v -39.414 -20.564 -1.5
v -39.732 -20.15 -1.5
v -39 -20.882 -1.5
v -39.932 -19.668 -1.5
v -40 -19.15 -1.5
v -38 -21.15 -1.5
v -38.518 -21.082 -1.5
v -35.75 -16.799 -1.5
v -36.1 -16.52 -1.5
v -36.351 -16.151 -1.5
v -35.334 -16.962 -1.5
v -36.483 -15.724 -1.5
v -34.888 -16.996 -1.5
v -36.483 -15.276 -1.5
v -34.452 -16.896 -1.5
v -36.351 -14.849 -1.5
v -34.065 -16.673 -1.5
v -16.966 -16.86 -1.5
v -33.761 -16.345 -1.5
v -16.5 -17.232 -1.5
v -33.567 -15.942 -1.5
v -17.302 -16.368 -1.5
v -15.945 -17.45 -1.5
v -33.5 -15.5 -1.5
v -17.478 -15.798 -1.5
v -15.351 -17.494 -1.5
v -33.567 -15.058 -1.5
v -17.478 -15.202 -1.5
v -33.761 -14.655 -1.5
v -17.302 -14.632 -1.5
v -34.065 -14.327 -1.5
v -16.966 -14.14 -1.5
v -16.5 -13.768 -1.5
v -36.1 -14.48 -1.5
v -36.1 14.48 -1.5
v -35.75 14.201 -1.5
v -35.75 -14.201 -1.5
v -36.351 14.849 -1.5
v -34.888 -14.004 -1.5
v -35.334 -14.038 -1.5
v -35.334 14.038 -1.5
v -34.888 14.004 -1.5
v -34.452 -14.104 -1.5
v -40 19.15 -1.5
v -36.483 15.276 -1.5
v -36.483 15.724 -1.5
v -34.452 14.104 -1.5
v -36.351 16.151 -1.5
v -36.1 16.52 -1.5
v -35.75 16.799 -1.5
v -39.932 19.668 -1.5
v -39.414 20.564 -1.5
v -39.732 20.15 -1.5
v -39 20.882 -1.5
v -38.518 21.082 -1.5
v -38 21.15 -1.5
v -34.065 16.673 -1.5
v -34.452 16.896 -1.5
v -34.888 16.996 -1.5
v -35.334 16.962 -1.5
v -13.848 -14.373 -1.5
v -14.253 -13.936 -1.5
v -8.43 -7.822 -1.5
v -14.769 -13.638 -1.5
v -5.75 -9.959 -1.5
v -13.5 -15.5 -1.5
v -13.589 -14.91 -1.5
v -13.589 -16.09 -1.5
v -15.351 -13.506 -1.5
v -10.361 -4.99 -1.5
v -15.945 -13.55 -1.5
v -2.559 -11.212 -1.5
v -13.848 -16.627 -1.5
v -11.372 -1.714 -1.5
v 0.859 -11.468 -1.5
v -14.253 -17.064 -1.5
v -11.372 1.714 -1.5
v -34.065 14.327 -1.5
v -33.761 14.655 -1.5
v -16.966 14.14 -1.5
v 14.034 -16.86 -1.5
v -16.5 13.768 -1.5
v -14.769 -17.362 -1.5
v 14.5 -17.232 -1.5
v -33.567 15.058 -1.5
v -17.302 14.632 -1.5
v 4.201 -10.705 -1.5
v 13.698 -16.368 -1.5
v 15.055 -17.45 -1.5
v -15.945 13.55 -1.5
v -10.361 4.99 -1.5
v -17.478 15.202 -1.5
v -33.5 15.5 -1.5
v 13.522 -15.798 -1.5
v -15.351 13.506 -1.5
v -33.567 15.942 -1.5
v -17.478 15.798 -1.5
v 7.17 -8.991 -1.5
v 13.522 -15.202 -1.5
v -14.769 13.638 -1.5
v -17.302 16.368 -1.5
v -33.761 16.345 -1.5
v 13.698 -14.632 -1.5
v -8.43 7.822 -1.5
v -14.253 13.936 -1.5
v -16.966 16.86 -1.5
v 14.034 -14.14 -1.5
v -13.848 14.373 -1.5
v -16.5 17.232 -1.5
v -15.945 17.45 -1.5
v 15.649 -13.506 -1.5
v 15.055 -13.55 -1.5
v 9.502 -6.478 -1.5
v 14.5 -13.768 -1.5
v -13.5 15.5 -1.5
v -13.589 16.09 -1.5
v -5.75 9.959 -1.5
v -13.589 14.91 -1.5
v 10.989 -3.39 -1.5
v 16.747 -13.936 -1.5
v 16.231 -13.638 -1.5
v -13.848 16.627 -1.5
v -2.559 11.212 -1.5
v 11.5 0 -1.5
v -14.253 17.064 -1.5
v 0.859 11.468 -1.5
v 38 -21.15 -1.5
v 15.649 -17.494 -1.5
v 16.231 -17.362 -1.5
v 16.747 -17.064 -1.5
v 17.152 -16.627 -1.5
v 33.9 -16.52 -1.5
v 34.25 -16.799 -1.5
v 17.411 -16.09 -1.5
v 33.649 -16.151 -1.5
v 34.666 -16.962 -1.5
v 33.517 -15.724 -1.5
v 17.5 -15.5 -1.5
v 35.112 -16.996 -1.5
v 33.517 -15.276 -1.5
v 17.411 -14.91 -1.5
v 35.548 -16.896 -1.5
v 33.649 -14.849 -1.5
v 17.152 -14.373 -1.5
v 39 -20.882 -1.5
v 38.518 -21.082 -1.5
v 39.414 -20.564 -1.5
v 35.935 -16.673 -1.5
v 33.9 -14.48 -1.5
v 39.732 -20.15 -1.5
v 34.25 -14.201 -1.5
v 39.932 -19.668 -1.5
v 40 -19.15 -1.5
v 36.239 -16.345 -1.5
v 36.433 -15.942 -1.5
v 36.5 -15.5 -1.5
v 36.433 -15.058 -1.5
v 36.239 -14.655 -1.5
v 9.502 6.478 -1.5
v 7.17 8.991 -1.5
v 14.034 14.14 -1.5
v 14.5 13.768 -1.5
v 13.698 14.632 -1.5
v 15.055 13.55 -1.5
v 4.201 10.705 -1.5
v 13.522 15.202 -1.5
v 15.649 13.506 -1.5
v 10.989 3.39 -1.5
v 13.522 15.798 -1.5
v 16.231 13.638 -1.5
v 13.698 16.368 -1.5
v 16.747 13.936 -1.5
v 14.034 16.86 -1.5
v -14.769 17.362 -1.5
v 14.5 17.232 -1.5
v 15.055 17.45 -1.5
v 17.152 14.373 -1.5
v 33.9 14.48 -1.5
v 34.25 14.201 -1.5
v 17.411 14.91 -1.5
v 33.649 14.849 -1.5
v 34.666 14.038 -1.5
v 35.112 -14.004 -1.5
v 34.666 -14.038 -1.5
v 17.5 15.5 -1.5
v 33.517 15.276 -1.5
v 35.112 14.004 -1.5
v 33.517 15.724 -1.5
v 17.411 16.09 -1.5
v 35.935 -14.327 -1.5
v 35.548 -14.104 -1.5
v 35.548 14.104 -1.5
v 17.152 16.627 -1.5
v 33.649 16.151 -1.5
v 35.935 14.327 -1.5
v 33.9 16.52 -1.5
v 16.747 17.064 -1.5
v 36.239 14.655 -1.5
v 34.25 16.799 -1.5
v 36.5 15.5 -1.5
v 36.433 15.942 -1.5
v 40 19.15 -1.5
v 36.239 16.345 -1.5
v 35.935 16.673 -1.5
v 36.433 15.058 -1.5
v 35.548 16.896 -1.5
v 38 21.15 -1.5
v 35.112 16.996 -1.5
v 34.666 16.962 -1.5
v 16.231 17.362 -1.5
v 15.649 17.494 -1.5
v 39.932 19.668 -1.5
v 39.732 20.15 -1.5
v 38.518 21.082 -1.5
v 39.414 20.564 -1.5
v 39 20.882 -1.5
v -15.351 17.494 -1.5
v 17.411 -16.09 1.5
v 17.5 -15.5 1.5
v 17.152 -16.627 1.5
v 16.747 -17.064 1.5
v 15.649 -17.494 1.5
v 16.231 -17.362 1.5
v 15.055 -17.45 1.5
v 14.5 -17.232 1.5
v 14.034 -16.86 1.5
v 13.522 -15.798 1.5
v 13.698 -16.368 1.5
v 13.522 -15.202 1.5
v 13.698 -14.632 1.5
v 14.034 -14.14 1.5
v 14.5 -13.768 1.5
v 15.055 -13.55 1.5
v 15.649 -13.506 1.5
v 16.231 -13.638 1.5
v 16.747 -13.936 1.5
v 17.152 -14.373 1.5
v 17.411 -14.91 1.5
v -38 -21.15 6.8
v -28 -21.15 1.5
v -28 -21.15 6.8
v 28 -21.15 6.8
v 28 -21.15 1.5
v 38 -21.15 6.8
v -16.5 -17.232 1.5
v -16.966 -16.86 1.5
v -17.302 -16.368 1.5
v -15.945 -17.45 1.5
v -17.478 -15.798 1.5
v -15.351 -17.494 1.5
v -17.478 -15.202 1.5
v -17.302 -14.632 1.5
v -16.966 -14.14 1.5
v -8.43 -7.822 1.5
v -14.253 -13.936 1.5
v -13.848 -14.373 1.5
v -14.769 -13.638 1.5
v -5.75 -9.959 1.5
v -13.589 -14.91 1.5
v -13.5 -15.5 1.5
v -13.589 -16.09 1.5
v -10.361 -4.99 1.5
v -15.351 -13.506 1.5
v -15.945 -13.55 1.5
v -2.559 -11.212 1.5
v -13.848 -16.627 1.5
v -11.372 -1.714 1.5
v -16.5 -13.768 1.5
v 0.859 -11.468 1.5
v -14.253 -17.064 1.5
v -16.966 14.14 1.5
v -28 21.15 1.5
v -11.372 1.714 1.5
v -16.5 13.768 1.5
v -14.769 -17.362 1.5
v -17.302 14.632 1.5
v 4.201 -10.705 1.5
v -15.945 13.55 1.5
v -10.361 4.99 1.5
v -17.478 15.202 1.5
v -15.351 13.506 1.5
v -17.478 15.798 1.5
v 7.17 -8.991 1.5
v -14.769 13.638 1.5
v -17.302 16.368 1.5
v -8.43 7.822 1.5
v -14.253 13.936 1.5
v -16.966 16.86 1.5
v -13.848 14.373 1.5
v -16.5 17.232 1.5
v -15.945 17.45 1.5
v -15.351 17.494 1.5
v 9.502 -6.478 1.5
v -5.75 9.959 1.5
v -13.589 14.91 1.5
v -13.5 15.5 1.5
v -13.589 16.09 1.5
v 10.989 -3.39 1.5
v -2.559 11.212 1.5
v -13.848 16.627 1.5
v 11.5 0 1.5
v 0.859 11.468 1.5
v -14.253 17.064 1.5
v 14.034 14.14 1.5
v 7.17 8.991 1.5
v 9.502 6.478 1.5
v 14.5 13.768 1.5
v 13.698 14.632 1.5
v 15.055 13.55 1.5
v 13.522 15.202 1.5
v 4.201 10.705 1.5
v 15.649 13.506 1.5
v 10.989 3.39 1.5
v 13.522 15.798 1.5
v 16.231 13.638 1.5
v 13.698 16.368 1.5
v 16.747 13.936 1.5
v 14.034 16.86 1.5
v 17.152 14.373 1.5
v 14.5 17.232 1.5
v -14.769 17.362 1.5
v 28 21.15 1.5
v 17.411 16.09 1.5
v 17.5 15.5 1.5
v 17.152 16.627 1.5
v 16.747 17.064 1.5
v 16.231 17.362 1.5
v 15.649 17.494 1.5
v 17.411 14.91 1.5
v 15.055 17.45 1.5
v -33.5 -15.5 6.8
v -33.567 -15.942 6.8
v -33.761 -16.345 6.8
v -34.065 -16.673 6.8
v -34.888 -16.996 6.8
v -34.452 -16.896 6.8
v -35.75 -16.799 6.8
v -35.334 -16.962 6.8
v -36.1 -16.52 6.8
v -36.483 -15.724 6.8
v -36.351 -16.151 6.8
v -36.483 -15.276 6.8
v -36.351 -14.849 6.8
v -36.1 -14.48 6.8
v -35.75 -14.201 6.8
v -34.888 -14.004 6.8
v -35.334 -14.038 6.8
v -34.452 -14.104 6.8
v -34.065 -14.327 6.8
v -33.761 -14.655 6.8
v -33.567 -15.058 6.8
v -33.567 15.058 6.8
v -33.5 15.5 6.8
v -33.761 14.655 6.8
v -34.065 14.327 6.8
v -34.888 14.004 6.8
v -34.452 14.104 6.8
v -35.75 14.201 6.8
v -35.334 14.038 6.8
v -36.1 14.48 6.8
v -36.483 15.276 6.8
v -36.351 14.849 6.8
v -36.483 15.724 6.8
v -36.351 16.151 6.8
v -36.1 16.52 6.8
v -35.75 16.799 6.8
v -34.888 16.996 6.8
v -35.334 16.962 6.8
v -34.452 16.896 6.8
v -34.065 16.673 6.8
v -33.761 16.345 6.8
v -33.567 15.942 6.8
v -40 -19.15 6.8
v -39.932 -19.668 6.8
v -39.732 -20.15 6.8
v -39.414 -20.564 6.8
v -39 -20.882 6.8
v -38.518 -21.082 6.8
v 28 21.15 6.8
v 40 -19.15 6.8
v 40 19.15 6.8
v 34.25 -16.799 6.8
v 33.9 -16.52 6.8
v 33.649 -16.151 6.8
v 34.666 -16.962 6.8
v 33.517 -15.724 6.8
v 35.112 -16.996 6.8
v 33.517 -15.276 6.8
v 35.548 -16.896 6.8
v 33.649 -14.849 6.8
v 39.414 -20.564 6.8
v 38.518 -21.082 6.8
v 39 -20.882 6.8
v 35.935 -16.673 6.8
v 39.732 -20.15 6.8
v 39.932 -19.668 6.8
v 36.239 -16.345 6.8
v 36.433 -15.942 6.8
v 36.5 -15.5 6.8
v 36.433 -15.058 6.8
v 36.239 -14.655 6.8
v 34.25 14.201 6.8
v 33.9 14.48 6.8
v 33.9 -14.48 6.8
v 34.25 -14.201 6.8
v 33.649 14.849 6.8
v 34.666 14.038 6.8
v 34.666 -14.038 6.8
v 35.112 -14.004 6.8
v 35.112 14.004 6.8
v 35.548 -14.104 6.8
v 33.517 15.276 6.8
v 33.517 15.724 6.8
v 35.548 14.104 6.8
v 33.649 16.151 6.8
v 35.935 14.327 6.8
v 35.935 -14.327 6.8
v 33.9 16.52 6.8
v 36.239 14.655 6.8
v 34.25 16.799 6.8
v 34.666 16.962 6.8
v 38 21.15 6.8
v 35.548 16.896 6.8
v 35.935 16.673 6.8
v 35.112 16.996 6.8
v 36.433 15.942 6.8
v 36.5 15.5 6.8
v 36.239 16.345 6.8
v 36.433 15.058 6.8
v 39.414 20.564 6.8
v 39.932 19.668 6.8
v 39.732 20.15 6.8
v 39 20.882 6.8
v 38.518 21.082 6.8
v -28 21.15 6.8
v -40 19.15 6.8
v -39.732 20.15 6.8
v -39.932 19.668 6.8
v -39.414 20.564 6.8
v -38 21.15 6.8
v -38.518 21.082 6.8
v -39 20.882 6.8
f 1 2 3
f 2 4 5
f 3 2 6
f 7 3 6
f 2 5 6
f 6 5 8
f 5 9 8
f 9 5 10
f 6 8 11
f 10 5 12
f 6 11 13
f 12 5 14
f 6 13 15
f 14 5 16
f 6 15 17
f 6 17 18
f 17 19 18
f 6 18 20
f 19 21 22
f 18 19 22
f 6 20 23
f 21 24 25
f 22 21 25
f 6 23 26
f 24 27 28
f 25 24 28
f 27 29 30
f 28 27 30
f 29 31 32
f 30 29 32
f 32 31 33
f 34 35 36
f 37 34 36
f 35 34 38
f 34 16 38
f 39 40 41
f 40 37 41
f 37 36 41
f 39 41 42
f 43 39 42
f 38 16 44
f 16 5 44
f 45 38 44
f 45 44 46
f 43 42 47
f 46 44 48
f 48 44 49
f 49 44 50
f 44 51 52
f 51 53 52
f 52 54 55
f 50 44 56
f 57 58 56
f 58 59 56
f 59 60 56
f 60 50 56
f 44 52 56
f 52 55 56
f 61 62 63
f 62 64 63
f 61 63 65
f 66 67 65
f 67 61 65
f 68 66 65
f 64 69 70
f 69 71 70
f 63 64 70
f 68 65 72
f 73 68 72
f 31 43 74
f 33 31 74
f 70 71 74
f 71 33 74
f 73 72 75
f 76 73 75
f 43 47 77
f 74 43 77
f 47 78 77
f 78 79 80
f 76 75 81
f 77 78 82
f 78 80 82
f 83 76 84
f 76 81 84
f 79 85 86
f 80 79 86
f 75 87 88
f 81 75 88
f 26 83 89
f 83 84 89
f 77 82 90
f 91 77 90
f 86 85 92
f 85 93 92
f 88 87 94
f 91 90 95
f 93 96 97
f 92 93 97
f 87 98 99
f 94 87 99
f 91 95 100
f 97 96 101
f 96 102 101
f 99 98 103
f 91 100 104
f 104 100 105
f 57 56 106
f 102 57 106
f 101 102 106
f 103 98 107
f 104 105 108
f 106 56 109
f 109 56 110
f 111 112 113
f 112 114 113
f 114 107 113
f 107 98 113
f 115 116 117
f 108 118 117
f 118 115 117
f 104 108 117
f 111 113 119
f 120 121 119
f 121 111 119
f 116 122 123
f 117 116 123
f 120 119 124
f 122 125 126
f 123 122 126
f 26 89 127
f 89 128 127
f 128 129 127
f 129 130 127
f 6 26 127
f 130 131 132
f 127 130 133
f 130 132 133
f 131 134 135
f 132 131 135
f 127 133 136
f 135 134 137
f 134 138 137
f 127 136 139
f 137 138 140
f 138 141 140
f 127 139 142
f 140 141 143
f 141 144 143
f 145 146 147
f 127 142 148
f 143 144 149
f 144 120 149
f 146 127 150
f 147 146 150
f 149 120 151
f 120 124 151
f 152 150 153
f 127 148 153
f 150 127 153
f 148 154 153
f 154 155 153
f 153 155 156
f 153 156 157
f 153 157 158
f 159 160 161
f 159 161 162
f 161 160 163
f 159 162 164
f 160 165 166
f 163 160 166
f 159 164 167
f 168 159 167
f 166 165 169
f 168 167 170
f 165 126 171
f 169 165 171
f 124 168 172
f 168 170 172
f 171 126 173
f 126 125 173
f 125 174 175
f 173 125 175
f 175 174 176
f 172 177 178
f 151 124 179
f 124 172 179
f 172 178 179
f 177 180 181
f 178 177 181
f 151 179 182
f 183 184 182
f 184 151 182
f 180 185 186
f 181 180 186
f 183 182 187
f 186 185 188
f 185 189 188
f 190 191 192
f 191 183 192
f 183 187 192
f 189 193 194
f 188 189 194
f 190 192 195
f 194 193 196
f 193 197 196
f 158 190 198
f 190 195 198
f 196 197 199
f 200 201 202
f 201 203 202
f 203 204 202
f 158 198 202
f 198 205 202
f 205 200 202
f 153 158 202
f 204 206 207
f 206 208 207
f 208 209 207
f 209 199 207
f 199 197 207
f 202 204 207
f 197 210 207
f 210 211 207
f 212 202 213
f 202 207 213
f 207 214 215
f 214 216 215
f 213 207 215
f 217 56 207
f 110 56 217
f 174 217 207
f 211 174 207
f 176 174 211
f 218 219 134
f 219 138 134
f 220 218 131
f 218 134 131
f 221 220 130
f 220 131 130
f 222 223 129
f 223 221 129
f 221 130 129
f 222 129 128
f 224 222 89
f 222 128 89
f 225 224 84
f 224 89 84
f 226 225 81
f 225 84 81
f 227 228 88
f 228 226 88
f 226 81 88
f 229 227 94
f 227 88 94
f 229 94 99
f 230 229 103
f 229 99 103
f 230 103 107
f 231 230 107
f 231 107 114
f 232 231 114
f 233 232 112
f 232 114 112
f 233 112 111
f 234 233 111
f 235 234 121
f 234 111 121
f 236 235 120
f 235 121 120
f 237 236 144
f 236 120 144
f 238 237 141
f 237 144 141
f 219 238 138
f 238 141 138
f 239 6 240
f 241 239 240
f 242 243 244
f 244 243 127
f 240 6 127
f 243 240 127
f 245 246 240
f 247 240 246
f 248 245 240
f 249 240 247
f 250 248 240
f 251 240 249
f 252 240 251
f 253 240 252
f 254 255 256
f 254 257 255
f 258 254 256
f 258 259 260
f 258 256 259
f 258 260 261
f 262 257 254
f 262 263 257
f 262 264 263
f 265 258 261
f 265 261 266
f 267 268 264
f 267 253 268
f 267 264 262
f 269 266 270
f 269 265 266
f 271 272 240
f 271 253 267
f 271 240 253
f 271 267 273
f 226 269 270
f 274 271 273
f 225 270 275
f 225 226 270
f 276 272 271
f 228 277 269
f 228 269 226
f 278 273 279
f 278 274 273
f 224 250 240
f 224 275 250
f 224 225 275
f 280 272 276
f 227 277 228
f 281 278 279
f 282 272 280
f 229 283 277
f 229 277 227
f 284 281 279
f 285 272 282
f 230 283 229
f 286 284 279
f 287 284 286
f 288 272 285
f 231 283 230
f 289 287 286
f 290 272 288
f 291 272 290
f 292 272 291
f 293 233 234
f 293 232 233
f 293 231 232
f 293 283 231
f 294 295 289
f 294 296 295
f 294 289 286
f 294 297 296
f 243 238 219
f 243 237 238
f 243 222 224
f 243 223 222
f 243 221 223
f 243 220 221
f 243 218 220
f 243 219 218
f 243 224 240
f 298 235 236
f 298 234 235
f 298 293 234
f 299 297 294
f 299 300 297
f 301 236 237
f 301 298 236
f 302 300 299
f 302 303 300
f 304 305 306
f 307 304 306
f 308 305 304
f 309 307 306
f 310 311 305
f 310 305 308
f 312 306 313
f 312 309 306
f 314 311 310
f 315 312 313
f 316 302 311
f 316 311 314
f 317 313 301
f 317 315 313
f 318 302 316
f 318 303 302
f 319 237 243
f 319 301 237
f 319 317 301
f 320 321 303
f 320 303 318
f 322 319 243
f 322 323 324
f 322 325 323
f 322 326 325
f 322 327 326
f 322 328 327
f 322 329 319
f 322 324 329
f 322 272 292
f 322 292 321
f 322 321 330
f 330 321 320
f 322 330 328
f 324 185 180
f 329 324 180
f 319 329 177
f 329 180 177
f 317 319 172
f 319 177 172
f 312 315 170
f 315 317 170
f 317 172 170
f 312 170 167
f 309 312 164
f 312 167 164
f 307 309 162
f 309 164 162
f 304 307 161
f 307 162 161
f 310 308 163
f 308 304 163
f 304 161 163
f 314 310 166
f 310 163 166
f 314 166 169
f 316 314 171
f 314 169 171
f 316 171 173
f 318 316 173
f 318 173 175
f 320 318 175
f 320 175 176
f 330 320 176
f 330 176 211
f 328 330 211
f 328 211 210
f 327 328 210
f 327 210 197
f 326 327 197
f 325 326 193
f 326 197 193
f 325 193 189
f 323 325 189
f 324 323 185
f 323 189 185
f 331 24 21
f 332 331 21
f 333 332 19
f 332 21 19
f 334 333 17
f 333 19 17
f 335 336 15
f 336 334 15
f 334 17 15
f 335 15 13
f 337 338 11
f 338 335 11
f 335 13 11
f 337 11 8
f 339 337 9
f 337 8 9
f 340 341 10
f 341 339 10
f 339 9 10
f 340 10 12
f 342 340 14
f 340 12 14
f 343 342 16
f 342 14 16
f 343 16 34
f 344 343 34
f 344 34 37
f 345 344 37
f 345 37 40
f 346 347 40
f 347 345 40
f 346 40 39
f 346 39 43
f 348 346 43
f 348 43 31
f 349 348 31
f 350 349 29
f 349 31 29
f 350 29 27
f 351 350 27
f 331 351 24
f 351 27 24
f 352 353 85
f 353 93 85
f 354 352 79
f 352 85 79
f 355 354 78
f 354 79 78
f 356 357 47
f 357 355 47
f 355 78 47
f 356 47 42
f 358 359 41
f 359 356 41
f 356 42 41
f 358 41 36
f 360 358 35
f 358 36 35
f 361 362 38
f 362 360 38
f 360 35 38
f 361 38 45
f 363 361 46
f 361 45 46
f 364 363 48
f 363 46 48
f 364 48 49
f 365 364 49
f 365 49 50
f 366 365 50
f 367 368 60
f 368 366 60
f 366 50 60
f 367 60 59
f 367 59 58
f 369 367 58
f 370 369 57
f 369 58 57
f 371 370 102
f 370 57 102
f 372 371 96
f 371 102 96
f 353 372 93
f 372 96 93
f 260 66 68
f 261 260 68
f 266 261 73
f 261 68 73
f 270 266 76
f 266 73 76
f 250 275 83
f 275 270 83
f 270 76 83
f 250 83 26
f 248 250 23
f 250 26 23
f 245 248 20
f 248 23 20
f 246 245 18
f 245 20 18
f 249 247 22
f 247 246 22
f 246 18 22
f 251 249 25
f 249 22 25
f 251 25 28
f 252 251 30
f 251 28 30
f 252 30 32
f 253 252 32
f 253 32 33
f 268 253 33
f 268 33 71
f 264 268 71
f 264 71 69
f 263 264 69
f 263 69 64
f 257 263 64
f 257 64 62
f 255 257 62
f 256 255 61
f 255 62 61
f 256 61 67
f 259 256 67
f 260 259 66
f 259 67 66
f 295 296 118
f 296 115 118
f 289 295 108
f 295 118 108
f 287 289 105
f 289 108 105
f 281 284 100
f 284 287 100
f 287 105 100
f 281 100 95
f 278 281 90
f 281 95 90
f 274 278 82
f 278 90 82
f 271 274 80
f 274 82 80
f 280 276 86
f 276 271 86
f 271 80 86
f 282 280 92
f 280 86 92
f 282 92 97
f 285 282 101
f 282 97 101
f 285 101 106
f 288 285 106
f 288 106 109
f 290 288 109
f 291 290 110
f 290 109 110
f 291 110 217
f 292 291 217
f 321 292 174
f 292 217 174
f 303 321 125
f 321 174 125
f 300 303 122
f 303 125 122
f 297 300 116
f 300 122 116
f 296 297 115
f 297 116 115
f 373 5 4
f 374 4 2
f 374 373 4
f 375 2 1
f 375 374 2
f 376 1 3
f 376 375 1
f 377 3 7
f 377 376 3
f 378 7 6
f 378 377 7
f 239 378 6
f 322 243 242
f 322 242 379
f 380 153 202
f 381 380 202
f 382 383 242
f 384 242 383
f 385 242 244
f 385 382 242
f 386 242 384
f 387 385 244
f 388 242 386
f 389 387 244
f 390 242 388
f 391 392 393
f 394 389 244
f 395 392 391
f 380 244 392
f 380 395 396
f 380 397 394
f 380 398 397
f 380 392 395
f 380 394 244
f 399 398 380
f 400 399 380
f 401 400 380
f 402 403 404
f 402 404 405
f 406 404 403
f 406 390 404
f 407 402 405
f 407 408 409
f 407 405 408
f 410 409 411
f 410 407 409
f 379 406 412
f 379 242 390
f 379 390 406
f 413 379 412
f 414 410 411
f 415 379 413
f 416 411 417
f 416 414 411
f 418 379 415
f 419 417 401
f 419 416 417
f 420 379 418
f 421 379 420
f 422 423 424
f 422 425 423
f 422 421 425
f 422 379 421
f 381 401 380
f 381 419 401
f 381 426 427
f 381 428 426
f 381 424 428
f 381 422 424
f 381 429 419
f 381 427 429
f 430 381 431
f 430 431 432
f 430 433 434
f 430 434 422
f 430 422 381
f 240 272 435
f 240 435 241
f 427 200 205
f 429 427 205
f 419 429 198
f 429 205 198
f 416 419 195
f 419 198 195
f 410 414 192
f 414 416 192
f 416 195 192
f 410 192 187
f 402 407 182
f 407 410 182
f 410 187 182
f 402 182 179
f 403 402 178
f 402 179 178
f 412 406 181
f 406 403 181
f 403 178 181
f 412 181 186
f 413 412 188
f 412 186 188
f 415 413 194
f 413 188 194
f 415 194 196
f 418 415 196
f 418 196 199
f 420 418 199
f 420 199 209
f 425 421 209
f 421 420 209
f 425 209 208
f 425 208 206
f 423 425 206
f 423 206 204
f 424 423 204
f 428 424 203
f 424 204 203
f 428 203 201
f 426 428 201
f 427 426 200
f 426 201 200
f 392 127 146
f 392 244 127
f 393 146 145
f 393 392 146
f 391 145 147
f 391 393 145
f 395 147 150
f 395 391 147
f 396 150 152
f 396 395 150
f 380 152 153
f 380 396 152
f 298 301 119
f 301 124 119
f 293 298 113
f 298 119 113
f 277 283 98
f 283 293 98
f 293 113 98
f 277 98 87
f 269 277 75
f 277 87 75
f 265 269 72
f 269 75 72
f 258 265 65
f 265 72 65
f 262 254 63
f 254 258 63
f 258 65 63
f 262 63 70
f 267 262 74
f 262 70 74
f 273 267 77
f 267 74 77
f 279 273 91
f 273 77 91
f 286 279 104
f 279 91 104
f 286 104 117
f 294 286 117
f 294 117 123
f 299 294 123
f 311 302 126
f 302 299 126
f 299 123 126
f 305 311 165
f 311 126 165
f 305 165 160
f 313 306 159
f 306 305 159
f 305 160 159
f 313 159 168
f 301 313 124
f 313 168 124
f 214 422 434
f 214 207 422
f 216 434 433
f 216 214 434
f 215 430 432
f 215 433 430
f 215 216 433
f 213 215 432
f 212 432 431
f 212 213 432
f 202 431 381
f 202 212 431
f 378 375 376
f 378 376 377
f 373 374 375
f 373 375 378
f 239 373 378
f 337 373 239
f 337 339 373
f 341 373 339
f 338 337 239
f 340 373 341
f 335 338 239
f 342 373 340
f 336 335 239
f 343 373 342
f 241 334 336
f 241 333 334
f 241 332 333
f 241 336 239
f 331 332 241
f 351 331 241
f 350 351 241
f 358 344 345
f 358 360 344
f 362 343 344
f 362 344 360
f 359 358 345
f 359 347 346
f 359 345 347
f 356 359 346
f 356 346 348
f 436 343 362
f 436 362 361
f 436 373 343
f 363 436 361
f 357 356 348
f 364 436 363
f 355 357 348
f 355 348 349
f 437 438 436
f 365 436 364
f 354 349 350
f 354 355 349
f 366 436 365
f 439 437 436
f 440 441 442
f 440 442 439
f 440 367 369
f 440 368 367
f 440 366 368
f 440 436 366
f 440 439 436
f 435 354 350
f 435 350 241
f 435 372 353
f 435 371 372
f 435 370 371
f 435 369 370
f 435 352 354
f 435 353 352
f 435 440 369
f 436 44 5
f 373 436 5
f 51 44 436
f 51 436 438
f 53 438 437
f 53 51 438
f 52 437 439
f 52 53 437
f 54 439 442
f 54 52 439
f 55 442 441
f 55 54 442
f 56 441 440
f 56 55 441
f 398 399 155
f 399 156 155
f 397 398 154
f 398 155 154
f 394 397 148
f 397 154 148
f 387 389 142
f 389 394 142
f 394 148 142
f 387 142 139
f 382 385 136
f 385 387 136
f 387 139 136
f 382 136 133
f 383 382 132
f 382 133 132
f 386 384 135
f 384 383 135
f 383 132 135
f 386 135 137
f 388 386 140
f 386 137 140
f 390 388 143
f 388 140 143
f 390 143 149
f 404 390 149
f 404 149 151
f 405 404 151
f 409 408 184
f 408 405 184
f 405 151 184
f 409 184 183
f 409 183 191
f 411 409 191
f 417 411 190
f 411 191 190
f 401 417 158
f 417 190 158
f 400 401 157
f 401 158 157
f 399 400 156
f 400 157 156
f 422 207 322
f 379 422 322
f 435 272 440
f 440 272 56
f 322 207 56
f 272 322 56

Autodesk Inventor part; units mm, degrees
ref_plane "YZ Plane" through (0, 0, 0) normal (1, 0, 0) x (0, 1, 0)
ref_plane "XZ Plane" through (0, 0, 0) normal (0, 1, 0) x (-1, 0, 0)
ref_plane "XY Plane" through (0, 0, 0) normal (0, 0, 1) x (1, 0, 0)
sketch "Sketch1" plane through (0, 0, 0) normal (0, 0, 1) x (1, 0, 0)
  line L0 (-40, -21.15) -> (40, -21.15)
  line L1 (40, -21.15) -> (40, 21.15)
  line L2 (40, 21.15) -> (-40, 21.15)
  line L3 (-40, 21.15) -> (-40, -21.15)
  line L4 (-15.5, -15.5) -> (15.5, -15.5) construction
  line L5 (15.5, -15.5) -> (15.5, 15.5) construction
  line L6 (15.5, 15.5) -> (-15.5, 15.5) construction
  line L7 (-15.5, 15.5) -> (-15.5, -15.5) construction
  line L8 (-15.5, -15.5) -> (15.5, 15.5) construction
  line L9 (15.5, -15.5) -> (-15.5, 15.5) construction
  circle A0 centre (-15.5, 15.5) radius 2
  circle A1 centre (15.5, 15.5) radius 2
  circle A2 centre (15.5, -15.5) radius 2
  circle A3 centre (-15.5, -15.5) radius 2
  circle A4 centre (-35, 15.5) radius 1.5
  circle A5 centre (-35, -15.5) radius 1.5
  circle A6 centre (35, -15.5) radius 1.5
  circle A7 centre (35, 15.5) radius 1.5
  circle A8 centre (0, 0) radius 11.5
  point P0 (-40, 0)
  point P1 (0, 21.15)
  dimension "d0" = 80
  dimension "d1" = 42.3
  dimension "d2" = 31
  dimension "d3" = 31
  dimension "d4" = 4
  dimension "d5" = 4
  dimension "d6" = 4
  dimension "d7" = 4
  dimension "d8" = 3
  dimension "d9" = 3
  dimension "d10" = 3
  dimension "d11" = 3
  dimension "d12" = 5
  dimension "d13" = 5
  dimension "d17" = 23
extrude "Extrusion1" add sketch "Sketch1" along normal mid plane 3
fillet "Fillet1" radius 2 4 edges at (-40, -21.15, 0) (-40, 21.15, 0) (40, -21.15, 0) (40, 21.15, 0)
sketch "Sketch2" plane through (0, 0, 1.5) normal (0, 0, 1) x (1, 0, 0)
  arc A0 (40, 19.15) -> (38, 21.15) centre (38, 19.15) ccw projected
  line L0 (38, 21.15) -> (-38, 21.15) projected
  arc A1 (-38, 21.15) -> (-40, 19.15) centre (-38, 19.15) ccw projected
  line L1 (-40, 19.15) -> (-40, -19.15) projected
  arc A2 (-40, -19.15) -> (-38, -21.15) centre (-38, -19.15) ccw projected
  line L2 (-38, -21.15) -> (38, -21.15) projected
  arc A3 (38, -21.15) -> (40, -19.15) centre (38, -19.15) ccw projected
  line L3 (40, -19.15) -> (40, 19.15) projected
  circle A4 centre (0, 0) radius 11.5 projected
  circle A5 centre (-15.5, 15.5) radius 2 projected
  circle A6 centre (15.5, 15.5) radius 2 projected
  circle A7 centre (15.5, -15.5) radius 2 projected
  circle A8 centre (-15.5, -15.5) radius 2 projected
  circle A9 centre (-35, 15.5) radius 1.5 projected
  circle A10 centre (-35, -15.5) radius 1.5 projected
  circle A11 centre (35, -15.5) radius 1.5 projected
  circle A12 centre (35, 15.5) radius 1.5 projected
  line L4 (-38, -21.15) -> (38, -21.15) projected
  line L5 (-28, -21.15) -> (28, -21.15)
  line L6 (28, -21.15) -> (28, 21.15)
  line L7 (28, 21.15) -> (-28, 21.15)
  line L8 (-28, 21.15) -> (-28, -21.15)
  point P0 (-28, 21.15)
  dimension "d18" = 12
  dimension "d19" = 12
extrude "Extrusion2" add sketch "Sketch2" along normal blind 5.3 contours L3 A3 L2 L6 L0 A0 | L8 L2 A2 L1 A1 L0
properties part number "3217a_Stepper Motor Plate_V1" material "Aluminum 6061"
